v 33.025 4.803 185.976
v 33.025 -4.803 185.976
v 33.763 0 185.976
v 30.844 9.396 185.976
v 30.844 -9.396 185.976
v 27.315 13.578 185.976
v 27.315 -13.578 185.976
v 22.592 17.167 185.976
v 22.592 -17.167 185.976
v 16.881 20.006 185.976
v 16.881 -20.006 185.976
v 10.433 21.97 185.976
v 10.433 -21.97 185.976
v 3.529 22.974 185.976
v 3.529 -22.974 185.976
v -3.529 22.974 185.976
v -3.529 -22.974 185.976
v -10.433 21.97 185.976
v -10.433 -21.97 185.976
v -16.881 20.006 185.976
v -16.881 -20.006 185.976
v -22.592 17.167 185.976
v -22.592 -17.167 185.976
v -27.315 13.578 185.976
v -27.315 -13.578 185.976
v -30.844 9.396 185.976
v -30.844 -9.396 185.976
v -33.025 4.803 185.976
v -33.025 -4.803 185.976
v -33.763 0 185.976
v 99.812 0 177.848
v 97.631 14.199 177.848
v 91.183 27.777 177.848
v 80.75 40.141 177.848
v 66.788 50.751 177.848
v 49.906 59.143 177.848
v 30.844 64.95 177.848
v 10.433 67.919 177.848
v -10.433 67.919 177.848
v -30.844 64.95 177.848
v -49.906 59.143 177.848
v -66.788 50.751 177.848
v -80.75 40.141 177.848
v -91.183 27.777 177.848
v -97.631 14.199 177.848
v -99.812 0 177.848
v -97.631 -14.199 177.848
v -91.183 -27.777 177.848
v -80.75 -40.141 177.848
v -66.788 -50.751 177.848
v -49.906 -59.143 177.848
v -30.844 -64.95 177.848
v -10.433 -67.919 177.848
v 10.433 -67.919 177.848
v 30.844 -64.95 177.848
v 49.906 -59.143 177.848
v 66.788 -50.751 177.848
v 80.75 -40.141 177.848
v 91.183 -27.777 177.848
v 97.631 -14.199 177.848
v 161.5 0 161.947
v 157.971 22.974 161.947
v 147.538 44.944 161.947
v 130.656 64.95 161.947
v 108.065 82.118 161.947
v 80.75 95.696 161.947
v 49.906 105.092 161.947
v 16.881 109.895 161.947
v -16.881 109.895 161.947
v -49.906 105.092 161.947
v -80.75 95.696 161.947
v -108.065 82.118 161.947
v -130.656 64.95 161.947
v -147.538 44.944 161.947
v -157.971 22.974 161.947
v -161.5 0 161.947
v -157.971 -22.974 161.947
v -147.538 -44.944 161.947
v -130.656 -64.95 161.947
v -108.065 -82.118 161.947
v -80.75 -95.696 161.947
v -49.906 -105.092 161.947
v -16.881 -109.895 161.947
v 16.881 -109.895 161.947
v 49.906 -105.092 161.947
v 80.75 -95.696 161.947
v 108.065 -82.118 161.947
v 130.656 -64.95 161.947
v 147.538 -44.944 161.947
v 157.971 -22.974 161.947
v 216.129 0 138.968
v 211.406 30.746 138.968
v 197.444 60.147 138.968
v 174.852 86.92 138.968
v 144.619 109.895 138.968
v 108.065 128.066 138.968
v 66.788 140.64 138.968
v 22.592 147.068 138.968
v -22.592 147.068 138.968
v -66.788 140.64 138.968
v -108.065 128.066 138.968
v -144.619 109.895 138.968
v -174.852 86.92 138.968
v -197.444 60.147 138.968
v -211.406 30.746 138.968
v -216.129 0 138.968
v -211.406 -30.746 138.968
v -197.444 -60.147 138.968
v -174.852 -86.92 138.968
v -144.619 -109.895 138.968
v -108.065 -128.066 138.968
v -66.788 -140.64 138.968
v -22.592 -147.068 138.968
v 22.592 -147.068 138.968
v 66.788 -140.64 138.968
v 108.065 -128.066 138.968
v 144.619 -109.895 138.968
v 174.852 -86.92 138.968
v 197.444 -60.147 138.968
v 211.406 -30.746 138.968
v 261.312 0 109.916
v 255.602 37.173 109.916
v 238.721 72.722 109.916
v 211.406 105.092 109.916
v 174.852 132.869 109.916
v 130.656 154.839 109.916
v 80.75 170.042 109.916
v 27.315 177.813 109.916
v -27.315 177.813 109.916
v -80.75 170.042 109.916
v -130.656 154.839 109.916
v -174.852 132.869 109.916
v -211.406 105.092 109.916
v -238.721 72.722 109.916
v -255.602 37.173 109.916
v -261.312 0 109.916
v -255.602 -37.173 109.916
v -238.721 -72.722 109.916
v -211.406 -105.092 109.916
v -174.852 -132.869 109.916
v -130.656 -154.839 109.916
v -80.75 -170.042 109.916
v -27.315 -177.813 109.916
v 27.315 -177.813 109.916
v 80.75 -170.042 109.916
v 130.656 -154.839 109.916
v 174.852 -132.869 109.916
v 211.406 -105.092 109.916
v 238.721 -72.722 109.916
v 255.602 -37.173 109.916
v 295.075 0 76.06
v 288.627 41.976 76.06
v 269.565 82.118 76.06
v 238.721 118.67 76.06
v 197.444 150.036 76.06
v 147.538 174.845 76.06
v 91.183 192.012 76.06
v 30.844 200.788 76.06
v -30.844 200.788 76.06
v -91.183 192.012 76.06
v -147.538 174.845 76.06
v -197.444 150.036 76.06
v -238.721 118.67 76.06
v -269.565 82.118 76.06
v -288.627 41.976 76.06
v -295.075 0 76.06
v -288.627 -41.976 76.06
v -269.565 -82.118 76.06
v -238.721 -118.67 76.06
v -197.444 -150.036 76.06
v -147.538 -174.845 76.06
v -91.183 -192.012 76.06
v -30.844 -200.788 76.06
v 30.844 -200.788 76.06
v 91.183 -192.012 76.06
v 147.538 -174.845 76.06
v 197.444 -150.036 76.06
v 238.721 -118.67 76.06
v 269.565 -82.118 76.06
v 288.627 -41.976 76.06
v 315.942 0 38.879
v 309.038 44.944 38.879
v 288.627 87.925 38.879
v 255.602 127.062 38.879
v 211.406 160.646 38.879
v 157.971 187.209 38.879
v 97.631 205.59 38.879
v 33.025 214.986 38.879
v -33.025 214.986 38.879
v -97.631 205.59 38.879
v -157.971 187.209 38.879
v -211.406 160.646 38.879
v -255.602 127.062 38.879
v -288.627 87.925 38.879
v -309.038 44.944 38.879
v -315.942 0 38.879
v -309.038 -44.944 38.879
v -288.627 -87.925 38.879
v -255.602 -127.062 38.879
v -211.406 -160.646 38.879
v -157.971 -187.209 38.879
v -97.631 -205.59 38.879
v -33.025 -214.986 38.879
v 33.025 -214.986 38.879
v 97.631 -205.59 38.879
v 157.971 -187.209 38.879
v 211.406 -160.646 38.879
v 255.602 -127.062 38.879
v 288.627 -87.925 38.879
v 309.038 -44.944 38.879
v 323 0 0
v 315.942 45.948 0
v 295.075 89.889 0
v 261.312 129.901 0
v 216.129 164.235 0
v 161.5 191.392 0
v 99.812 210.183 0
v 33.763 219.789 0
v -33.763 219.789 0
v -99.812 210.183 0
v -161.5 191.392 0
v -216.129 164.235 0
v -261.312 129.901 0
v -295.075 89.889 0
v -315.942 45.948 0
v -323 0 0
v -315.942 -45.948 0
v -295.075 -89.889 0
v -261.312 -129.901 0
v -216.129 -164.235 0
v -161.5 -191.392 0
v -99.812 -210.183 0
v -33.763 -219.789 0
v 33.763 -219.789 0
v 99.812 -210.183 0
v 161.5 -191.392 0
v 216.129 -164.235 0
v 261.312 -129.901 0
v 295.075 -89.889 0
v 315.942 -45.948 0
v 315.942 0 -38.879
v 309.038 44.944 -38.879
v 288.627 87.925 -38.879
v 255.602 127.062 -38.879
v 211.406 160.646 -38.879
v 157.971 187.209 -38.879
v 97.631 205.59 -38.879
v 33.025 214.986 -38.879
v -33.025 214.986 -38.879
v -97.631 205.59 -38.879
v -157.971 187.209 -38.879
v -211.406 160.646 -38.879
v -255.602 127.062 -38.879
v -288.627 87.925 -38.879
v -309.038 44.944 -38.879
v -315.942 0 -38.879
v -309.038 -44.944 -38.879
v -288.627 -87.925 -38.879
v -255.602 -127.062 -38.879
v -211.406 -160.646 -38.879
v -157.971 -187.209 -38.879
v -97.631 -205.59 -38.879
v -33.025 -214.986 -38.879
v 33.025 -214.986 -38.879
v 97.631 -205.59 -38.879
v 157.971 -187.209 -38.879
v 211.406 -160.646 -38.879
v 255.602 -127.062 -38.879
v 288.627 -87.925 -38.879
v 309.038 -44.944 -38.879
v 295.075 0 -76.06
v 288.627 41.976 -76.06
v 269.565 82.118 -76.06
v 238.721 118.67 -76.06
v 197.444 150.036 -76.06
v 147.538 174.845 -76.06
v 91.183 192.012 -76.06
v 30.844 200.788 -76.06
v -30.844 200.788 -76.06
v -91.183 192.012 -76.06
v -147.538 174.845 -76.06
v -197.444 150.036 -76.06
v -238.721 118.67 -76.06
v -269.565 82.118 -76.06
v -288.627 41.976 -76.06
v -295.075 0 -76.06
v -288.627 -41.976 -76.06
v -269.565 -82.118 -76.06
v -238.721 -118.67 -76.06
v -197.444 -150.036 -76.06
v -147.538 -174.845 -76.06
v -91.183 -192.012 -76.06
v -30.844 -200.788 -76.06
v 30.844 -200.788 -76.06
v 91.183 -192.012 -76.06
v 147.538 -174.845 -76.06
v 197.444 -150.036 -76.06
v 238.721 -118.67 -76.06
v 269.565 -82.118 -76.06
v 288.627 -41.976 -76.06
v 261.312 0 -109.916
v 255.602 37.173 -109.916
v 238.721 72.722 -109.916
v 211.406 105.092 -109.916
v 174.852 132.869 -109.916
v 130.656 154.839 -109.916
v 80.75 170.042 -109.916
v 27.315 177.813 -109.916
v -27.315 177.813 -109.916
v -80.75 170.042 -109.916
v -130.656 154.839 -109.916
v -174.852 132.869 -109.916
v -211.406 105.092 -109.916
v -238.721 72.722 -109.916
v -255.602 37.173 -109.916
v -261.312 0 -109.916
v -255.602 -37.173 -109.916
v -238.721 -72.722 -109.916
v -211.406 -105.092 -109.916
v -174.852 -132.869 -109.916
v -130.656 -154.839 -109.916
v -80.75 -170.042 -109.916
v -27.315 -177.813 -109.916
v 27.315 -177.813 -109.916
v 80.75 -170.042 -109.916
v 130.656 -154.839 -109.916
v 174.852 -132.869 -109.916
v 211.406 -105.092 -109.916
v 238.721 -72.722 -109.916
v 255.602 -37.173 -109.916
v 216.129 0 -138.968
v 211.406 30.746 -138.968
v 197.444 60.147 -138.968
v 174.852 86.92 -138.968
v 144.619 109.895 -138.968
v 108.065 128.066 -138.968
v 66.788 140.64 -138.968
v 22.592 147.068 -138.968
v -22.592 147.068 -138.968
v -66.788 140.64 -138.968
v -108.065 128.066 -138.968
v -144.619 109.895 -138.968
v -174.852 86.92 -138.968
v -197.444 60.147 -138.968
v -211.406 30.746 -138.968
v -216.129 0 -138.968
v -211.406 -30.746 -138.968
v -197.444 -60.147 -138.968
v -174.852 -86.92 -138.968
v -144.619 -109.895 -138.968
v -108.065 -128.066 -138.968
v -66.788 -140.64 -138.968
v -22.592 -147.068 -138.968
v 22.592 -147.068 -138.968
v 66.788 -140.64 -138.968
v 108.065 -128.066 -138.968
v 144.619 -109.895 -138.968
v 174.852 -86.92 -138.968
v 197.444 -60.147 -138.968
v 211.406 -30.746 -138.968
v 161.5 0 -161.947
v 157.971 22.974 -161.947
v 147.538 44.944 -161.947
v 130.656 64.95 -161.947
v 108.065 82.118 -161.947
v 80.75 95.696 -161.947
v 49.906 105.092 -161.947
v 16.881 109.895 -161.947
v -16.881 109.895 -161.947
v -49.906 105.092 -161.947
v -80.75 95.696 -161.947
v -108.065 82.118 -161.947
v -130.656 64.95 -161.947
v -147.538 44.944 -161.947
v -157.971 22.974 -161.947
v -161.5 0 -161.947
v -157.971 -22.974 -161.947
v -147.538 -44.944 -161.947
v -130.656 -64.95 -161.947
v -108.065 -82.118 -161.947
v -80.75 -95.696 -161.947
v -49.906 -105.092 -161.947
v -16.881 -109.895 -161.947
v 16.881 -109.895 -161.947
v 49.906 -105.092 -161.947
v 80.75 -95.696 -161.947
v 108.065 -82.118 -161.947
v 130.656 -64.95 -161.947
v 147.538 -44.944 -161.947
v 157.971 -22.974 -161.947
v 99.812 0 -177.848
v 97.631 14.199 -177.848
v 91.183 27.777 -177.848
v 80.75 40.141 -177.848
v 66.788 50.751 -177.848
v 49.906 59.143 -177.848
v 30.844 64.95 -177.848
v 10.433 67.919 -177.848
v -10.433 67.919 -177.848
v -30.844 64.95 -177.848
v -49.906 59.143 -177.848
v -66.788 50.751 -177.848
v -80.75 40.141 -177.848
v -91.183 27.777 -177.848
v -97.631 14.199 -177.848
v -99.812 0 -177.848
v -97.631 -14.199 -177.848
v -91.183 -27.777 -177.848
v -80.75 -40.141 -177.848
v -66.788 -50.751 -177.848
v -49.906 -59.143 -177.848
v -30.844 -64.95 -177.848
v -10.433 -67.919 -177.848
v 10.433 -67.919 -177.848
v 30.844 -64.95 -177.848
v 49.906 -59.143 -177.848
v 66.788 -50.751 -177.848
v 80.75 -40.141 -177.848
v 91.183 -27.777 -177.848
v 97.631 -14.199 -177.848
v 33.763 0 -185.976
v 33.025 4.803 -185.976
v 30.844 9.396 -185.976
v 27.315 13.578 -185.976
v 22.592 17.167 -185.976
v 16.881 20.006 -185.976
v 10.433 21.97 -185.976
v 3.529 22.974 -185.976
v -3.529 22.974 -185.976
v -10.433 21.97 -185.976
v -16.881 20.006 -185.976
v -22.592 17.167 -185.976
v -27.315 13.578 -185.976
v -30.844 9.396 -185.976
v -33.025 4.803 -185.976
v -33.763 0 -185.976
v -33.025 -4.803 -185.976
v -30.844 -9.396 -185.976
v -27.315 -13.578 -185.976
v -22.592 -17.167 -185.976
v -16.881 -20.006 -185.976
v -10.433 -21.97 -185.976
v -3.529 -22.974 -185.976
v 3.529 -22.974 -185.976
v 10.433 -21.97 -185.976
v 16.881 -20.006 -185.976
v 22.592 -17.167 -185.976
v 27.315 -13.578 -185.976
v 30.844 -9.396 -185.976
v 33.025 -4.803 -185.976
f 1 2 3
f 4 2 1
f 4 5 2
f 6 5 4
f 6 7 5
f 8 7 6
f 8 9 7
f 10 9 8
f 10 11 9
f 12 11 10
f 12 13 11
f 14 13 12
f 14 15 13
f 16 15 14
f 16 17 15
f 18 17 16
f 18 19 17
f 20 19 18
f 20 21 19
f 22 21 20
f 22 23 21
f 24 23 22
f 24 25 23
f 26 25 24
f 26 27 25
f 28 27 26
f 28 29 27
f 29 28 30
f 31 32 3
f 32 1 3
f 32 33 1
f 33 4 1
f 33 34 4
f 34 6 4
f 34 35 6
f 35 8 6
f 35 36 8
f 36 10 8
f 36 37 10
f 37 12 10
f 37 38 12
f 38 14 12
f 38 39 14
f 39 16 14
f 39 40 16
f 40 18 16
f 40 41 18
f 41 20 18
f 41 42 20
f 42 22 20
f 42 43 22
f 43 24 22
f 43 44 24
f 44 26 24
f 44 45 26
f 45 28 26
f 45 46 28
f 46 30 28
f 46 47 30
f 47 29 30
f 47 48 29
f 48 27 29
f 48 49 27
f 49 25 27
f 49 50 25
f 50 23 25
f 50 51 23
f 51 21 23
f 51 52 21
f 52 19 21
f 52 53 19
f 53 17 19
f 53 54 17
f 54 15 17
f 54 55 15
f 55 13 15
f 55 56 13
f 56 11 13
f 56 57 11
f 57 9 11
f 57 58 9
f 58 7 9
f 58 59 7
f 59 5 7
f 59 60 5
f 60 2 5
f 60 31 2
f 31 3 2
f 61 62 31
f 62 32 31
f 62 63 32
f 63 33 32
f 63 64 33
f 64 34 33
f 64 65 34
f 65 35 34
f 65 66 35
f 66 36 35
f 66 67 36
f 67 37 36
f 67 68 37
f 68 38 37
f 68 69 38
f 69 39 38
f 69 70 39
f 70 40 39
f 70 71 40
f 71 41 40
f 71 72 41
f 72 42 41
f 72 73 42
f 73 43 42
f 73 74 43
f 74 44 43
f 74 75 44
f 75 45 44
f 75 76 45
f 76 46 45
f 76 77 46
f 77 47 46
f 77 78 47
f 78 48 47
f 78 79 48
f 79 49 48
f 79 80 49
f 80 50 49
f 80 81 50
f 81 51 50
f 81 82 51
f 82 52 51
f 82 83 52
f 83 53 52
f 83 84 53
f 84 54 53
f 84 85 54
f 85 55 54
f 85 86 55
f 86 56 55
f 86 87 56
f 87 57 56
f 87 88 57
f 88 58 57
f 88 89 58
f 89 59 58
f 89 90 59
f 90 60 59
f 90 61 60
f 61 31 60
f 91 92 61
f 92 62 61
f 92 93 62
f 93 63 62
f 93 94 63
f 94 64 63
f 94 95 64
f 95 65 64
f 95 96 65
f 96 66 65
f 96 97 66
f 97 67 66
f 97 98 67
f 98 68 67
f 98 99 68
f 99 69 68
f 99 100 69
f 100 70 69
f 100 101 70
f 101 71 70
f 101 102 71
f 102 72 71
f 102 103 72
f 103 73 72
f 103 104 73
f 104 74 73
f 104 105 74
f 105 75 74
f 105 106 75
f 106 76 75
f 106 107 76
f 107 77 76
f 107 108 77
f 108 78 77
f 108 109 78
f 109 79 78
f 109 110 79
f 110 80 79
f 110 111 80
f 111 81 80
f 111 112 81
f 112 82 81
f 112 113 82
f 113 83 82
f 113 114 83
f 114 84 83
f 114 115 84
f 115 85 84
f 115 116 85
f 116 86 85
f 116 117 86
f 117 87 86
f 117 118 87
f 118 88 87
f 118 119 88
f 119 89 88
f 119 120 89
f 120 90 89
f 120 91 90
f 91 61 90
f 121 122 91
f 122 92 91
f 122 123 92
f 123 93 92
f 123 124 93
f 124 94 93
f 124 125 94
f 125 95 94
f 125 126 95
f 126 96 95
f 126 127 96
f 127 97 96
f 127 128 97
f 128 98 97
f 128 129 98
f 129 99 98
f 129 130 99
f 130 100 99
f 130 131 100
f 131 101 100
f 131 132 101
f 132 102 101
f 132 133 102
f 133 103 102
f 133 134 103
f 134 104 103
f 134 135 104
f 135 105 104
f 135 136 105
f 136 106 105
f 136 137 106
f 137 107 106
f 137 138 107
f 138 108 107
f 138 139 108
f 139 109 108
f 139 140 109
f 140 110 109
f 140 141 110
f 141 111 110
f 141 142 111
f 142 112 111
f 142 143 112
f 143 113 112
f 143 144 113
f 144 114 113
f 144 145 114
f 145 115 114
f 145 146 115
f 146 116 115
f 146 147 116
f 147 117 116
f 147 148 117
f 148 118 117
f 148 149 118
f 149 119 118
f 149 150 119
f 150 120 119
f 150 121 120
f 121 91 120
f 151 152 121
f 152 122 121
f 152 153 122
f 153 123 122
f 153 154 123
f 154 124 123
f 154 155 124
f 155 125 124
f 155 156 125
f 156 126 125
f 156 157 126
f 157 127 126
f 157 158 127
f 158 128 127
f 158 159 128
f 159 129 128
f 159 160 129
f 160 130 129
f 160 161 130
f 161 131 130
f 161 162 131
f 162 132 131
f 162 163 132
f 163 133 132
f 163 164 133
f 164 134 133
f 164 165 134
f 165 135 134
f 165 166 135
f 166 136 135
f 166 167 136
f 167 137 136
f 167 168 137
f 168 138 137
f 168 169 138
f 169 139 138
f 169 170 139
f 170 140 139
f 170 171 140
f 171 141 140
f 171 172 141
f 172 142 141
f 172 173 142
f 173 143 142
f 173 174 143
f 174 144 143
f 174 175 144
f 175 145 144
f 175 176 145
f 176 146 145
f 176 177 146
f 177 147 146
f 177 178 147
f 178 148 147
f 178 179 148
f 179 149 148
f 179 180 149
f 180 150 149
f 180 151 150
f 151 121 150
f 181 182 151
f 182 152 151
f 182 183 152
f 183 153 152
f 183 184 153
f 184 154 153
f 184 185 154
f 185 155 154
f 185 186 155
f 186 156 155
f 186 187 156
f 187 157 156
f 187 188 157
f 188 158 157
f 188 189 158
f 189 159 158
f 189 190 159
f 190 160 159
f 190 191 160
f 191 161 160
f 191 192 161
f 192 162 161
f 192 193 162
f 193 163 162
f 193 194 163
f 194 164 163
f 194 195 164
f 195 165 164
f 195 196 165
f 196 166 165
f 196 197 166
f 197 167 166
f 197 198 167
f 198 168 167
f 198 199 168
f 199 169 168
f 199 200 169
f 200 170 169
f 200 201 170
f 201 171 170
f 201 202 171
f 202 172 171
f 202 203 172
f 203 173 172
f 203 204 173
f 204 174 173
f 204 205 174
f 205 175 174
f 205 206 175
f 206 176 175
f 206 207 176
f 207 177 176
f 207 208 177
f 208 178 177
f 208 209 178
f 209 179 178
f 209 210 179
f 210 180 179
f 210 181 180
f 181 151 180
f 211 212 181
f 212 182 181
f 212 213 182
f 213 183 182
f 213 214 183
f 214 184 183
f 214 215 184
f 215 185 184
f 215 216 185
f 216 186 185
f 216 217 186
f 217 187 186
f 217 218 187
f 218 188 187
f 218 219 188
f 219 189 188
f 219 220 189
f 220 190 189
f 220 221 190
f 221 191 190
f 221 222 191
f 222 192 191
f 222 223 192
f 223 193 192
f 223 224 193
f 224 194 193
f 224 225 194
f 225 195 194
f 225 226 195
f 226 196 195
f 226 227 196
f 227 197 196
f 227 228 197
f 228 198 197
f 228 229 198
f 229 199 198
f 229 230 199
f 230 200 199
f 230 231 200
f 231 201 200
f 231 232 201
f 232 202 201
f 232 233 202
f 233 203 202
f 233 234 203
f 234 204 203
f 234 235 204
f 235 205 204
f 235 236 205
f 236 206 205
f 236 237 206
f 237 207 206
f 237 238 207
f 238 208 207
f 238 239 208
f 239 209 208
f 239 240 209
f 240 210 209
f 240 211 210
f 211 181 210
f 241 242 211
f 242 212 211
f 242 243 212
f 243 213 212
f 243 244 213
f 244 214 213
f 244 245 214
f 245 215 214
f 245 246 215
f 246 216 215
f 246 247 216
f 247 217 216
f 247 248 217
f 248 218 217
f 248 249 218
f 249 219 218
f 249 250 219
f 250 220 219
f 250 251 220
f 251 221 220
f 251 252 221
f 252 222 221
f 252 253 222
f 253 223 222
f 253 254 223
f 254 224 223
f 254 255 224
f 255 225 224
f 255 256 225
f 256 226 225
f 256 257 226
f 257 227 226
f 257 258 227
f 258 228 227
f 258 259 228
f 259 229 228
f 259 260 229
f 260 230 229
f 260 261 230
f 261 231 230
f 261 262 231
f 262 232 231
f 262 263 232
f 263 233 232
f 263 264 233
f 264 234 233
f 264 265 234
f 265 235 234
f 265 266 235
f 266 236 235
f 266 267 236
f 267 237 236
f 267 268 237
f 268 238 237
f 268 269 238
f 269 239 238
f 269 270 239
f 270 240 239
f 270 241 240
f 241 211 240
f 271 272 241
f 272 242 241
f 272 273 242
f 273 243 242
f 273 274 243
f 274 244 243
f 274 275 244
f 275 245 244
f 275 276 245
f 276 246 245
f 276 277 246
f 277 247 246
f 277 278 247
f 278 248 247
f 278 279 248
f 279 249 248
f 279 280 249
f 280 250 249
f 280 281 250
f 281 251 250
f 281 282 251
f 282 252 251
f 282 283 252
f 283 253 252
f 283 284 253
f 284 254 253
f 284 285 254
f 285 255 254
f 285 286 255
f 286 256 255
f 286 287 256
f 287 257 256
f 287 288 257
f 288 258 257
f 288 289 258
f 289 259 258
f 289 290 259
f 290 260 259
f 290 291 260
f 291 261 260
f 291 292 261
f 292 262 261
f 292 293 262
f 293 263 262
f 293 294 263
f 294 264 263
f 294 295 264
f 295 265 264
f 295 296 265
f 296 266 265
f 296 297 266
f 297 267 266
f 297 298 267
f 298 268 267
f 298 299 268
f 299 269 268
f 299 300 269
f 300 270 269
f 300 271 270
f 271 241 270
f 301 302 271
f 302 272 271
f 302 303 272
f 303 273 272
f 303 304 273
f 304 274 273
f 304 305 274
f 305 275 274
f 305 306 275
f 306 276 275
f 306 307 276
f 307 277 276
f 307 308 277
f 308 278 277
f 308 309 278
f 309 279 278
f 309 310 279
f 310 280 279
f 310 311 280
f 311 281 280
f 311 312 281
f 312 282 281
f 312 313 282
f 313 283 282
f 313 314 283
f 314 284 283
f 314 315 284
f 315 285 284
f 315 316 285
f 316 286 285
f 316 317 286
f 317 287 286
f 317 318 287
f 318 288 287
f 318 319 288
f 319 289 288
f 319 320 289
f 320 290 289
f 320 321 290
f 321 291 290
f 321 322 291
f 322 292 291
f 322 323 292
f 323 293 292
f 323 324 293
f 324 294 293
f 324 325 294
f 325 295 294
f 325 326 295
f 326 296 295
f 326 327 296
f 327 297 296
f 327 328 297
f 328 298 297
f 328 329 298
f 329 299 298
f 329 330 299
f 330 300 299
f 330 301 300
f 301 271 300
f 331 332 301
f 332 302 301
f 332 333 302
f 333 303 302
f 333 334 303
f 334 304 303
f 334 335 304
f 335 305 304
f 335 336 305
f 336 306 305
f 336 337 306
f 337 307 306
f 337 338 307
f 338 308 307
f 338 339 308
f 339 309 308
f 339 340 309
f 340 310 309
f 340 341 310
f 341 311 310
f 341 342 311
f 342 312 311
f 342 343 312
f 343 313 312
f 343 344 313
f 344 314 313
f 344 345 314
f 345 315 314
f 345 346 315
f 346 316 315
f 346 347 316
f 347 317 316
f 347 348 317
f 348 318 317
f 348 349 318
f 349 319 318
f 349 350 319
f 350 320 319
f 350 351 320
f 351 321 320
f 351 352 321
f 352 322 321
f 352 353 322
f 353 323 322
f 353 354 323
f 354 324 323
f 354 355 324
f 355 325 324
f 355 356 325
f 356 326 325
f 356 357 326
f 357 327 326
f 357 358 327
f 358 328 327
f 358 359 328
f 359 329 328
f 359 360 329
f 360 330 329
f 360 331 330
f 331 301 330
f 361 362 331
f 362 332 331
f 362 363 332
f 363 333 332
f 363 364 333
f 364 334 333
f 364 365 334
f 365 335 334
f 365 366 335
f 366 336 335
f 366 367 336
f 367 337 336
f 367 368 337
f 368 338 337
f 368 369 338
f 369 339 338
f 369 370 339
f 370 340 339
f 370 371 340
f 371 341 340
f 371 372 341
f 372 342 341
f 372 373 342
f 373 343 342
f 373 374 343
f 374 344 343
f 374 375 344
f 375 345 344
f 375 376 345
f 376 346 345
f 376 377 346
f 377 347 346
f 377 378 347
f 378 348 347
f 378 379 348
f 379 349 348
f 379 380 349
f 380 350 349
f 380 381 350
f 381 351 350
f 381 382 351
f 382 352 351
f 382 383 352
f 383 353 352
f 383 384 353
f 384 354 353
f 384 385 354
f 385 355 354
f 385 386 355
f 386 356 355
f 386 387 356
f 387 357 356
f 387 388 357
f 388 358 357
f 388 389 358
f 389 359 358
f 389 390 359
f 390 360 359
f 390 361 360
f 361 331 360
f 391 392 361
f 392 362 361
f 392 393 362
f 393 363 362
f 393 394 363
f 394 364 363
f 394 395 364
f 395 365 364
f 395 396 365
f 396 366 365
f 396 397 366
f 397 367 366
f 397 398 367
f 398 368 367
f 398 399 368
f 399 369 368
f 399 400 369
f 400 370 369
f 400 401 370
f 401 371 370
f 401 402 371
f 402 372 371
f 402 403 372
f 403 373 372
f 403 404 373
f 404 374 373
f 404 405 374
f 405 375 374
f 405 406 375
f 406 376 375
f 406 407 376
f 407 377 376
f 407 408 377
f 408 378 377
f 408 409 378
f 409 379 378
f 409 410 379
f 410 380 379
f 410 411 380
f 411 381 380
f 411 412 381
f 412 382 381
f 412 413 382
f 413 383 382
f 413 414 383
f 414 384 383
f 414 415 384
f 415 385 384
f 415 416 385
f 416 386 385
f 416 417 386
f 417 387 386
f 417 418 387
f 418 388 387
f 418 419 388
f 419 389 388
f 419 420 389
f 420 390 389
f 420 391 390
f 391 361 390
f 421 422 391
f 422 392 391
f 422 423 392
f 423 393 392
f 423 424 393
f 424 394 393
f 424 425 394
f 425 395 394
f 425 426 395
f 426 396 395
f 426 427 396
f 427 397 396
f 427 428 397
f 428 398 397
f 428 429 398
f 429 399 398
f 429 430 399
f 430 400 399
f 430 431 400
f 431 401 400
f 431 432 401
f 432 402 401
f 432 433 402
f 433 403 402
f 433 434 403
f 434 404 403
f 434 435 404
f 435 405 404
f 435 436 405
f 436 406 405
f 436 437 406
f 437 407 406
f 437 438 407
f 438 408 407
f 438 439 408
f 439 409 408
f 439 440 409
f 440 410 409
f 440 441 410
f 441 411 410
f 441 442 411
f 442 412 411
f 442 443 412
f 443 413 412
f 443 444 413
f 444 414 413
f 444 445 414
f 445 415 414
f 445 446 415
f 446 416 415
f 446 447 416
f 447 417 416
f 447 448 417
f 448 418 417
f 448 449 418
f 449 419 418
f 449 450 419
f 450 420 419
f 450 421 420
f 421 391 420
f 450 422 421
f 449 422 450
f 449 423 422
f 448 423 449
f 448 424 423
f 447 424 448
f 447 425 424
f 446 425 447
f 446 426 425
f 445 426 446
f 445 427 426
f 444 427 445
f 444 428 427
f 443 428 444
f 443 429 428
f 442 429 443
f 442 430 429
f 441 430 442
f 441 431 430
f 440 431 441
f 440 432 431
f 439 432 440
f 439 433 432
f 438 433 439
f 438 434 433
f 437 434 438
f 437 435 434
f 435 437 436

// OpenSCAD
// Generated by SolidPython 1.0.1 on 2020-07-29 00:46:54


scale(v = [19, 13, 11]) {
	sphere(r = 17);
}
/***********************************************
*********      SolidPython code:      **********
************************************************
 
# import packages: SolidPython
from solid import *
from solid.utils import *
from itertools import chain, combinations, permutations


class Resize:

    def __init__(self, scad_file):
        self.scad_file = scad_file
        #self.scad_file = import_scad(scad_file)
        # cone/cylinder param:
        self.r1 = 0
        self.r2 = 0
        self.h = 0
        # rectangular prism param:
        self.w = 0
        self.l = 0
        # ellipse param:
        self.r = 0

    # import OpenScad code (file name corresponds to shape)


    # classify shape + parameters
    def assign(self, param1, param2, param3):
        if self.scad_file == 'cone.scad':
            self.r1 = param1
            self.r2 = param2
            self.h = param3
        elif self.scad_file == 'cylinder.scad':
            self.r1 = param1
            self.r2 = param2
            self.h = param3
        elif self.scad_file == 'rectangularPrism.scad':
            self.h = param1
            self.l = param2
            self.w = param3
        else:
            self.r = param1
            self.h = param2

    # resize parameters
    def iterate(self):
        x = range(3, 20, 2)
        i = 1
        if self.scad_file == 'cone.scad':
            tempList = list(permutations(x, 2))
            for temp in tempList:
                param1 = temp[0]
                param2 = temp[1]
                filepath = 'produced_scad_files/' + 'cone' + str(param1) + '_' + str(param2) + '_' + '.scad'
                scad_render_to_file(cylinder(h=param1, r1=param2, r2=0), filepath)

        elif self.scad_file == 'cylinder.scad':
            tempList = list(permutations(x, 3))
            for temp in tempList:
                param1 = temp[0]
                param2 = temp[1]
                filepath = 'produced_scad_files/' + 'cylinder' + str(param1) + '_' + str(param2) + '_' + '.scad'
                scad_render_to_file(cylinder(h=param1, r1=param2, r2=param2), filepath)

        elif self.scad_file == 'rectangularPrism.scad':
            tempList = list(permutations(x, 3))
            for temp in tempList:
                param1 = temp[0]
                param2 = temp[1]
                param3 = temp[2]
                filepath = 'produced_scad_files/' + 'rectangularPrism' + str(param1) + '_' + str(param2) + '_' + str(
                    param3) + '.scad'
                scad_render_to_file(cube(size=(param1, param2, param3)), filepath)

        elif self.scad_file == 'ellipse.scad':
            tempList = list(permutations(x, 4))
            for temp in tempList:
                param1 = temp[0]
                param2 = temp[1]
                param3 = temp[2]
                param4 = temp[3]
                filepath = 'produced_scad_files/' + 'ellipse' + str(param1) + '_' + str(param2) + '_' + str(param3) + '_' + str(param4) + '.scad'
                scad_render_to_file(scale([param1, param2, param3])(sphere(r=param4)), filepath)

    def render_to_scadfile(self):
        scad_render_to_file(scad, 'example.scad') 
 
************************************************/
